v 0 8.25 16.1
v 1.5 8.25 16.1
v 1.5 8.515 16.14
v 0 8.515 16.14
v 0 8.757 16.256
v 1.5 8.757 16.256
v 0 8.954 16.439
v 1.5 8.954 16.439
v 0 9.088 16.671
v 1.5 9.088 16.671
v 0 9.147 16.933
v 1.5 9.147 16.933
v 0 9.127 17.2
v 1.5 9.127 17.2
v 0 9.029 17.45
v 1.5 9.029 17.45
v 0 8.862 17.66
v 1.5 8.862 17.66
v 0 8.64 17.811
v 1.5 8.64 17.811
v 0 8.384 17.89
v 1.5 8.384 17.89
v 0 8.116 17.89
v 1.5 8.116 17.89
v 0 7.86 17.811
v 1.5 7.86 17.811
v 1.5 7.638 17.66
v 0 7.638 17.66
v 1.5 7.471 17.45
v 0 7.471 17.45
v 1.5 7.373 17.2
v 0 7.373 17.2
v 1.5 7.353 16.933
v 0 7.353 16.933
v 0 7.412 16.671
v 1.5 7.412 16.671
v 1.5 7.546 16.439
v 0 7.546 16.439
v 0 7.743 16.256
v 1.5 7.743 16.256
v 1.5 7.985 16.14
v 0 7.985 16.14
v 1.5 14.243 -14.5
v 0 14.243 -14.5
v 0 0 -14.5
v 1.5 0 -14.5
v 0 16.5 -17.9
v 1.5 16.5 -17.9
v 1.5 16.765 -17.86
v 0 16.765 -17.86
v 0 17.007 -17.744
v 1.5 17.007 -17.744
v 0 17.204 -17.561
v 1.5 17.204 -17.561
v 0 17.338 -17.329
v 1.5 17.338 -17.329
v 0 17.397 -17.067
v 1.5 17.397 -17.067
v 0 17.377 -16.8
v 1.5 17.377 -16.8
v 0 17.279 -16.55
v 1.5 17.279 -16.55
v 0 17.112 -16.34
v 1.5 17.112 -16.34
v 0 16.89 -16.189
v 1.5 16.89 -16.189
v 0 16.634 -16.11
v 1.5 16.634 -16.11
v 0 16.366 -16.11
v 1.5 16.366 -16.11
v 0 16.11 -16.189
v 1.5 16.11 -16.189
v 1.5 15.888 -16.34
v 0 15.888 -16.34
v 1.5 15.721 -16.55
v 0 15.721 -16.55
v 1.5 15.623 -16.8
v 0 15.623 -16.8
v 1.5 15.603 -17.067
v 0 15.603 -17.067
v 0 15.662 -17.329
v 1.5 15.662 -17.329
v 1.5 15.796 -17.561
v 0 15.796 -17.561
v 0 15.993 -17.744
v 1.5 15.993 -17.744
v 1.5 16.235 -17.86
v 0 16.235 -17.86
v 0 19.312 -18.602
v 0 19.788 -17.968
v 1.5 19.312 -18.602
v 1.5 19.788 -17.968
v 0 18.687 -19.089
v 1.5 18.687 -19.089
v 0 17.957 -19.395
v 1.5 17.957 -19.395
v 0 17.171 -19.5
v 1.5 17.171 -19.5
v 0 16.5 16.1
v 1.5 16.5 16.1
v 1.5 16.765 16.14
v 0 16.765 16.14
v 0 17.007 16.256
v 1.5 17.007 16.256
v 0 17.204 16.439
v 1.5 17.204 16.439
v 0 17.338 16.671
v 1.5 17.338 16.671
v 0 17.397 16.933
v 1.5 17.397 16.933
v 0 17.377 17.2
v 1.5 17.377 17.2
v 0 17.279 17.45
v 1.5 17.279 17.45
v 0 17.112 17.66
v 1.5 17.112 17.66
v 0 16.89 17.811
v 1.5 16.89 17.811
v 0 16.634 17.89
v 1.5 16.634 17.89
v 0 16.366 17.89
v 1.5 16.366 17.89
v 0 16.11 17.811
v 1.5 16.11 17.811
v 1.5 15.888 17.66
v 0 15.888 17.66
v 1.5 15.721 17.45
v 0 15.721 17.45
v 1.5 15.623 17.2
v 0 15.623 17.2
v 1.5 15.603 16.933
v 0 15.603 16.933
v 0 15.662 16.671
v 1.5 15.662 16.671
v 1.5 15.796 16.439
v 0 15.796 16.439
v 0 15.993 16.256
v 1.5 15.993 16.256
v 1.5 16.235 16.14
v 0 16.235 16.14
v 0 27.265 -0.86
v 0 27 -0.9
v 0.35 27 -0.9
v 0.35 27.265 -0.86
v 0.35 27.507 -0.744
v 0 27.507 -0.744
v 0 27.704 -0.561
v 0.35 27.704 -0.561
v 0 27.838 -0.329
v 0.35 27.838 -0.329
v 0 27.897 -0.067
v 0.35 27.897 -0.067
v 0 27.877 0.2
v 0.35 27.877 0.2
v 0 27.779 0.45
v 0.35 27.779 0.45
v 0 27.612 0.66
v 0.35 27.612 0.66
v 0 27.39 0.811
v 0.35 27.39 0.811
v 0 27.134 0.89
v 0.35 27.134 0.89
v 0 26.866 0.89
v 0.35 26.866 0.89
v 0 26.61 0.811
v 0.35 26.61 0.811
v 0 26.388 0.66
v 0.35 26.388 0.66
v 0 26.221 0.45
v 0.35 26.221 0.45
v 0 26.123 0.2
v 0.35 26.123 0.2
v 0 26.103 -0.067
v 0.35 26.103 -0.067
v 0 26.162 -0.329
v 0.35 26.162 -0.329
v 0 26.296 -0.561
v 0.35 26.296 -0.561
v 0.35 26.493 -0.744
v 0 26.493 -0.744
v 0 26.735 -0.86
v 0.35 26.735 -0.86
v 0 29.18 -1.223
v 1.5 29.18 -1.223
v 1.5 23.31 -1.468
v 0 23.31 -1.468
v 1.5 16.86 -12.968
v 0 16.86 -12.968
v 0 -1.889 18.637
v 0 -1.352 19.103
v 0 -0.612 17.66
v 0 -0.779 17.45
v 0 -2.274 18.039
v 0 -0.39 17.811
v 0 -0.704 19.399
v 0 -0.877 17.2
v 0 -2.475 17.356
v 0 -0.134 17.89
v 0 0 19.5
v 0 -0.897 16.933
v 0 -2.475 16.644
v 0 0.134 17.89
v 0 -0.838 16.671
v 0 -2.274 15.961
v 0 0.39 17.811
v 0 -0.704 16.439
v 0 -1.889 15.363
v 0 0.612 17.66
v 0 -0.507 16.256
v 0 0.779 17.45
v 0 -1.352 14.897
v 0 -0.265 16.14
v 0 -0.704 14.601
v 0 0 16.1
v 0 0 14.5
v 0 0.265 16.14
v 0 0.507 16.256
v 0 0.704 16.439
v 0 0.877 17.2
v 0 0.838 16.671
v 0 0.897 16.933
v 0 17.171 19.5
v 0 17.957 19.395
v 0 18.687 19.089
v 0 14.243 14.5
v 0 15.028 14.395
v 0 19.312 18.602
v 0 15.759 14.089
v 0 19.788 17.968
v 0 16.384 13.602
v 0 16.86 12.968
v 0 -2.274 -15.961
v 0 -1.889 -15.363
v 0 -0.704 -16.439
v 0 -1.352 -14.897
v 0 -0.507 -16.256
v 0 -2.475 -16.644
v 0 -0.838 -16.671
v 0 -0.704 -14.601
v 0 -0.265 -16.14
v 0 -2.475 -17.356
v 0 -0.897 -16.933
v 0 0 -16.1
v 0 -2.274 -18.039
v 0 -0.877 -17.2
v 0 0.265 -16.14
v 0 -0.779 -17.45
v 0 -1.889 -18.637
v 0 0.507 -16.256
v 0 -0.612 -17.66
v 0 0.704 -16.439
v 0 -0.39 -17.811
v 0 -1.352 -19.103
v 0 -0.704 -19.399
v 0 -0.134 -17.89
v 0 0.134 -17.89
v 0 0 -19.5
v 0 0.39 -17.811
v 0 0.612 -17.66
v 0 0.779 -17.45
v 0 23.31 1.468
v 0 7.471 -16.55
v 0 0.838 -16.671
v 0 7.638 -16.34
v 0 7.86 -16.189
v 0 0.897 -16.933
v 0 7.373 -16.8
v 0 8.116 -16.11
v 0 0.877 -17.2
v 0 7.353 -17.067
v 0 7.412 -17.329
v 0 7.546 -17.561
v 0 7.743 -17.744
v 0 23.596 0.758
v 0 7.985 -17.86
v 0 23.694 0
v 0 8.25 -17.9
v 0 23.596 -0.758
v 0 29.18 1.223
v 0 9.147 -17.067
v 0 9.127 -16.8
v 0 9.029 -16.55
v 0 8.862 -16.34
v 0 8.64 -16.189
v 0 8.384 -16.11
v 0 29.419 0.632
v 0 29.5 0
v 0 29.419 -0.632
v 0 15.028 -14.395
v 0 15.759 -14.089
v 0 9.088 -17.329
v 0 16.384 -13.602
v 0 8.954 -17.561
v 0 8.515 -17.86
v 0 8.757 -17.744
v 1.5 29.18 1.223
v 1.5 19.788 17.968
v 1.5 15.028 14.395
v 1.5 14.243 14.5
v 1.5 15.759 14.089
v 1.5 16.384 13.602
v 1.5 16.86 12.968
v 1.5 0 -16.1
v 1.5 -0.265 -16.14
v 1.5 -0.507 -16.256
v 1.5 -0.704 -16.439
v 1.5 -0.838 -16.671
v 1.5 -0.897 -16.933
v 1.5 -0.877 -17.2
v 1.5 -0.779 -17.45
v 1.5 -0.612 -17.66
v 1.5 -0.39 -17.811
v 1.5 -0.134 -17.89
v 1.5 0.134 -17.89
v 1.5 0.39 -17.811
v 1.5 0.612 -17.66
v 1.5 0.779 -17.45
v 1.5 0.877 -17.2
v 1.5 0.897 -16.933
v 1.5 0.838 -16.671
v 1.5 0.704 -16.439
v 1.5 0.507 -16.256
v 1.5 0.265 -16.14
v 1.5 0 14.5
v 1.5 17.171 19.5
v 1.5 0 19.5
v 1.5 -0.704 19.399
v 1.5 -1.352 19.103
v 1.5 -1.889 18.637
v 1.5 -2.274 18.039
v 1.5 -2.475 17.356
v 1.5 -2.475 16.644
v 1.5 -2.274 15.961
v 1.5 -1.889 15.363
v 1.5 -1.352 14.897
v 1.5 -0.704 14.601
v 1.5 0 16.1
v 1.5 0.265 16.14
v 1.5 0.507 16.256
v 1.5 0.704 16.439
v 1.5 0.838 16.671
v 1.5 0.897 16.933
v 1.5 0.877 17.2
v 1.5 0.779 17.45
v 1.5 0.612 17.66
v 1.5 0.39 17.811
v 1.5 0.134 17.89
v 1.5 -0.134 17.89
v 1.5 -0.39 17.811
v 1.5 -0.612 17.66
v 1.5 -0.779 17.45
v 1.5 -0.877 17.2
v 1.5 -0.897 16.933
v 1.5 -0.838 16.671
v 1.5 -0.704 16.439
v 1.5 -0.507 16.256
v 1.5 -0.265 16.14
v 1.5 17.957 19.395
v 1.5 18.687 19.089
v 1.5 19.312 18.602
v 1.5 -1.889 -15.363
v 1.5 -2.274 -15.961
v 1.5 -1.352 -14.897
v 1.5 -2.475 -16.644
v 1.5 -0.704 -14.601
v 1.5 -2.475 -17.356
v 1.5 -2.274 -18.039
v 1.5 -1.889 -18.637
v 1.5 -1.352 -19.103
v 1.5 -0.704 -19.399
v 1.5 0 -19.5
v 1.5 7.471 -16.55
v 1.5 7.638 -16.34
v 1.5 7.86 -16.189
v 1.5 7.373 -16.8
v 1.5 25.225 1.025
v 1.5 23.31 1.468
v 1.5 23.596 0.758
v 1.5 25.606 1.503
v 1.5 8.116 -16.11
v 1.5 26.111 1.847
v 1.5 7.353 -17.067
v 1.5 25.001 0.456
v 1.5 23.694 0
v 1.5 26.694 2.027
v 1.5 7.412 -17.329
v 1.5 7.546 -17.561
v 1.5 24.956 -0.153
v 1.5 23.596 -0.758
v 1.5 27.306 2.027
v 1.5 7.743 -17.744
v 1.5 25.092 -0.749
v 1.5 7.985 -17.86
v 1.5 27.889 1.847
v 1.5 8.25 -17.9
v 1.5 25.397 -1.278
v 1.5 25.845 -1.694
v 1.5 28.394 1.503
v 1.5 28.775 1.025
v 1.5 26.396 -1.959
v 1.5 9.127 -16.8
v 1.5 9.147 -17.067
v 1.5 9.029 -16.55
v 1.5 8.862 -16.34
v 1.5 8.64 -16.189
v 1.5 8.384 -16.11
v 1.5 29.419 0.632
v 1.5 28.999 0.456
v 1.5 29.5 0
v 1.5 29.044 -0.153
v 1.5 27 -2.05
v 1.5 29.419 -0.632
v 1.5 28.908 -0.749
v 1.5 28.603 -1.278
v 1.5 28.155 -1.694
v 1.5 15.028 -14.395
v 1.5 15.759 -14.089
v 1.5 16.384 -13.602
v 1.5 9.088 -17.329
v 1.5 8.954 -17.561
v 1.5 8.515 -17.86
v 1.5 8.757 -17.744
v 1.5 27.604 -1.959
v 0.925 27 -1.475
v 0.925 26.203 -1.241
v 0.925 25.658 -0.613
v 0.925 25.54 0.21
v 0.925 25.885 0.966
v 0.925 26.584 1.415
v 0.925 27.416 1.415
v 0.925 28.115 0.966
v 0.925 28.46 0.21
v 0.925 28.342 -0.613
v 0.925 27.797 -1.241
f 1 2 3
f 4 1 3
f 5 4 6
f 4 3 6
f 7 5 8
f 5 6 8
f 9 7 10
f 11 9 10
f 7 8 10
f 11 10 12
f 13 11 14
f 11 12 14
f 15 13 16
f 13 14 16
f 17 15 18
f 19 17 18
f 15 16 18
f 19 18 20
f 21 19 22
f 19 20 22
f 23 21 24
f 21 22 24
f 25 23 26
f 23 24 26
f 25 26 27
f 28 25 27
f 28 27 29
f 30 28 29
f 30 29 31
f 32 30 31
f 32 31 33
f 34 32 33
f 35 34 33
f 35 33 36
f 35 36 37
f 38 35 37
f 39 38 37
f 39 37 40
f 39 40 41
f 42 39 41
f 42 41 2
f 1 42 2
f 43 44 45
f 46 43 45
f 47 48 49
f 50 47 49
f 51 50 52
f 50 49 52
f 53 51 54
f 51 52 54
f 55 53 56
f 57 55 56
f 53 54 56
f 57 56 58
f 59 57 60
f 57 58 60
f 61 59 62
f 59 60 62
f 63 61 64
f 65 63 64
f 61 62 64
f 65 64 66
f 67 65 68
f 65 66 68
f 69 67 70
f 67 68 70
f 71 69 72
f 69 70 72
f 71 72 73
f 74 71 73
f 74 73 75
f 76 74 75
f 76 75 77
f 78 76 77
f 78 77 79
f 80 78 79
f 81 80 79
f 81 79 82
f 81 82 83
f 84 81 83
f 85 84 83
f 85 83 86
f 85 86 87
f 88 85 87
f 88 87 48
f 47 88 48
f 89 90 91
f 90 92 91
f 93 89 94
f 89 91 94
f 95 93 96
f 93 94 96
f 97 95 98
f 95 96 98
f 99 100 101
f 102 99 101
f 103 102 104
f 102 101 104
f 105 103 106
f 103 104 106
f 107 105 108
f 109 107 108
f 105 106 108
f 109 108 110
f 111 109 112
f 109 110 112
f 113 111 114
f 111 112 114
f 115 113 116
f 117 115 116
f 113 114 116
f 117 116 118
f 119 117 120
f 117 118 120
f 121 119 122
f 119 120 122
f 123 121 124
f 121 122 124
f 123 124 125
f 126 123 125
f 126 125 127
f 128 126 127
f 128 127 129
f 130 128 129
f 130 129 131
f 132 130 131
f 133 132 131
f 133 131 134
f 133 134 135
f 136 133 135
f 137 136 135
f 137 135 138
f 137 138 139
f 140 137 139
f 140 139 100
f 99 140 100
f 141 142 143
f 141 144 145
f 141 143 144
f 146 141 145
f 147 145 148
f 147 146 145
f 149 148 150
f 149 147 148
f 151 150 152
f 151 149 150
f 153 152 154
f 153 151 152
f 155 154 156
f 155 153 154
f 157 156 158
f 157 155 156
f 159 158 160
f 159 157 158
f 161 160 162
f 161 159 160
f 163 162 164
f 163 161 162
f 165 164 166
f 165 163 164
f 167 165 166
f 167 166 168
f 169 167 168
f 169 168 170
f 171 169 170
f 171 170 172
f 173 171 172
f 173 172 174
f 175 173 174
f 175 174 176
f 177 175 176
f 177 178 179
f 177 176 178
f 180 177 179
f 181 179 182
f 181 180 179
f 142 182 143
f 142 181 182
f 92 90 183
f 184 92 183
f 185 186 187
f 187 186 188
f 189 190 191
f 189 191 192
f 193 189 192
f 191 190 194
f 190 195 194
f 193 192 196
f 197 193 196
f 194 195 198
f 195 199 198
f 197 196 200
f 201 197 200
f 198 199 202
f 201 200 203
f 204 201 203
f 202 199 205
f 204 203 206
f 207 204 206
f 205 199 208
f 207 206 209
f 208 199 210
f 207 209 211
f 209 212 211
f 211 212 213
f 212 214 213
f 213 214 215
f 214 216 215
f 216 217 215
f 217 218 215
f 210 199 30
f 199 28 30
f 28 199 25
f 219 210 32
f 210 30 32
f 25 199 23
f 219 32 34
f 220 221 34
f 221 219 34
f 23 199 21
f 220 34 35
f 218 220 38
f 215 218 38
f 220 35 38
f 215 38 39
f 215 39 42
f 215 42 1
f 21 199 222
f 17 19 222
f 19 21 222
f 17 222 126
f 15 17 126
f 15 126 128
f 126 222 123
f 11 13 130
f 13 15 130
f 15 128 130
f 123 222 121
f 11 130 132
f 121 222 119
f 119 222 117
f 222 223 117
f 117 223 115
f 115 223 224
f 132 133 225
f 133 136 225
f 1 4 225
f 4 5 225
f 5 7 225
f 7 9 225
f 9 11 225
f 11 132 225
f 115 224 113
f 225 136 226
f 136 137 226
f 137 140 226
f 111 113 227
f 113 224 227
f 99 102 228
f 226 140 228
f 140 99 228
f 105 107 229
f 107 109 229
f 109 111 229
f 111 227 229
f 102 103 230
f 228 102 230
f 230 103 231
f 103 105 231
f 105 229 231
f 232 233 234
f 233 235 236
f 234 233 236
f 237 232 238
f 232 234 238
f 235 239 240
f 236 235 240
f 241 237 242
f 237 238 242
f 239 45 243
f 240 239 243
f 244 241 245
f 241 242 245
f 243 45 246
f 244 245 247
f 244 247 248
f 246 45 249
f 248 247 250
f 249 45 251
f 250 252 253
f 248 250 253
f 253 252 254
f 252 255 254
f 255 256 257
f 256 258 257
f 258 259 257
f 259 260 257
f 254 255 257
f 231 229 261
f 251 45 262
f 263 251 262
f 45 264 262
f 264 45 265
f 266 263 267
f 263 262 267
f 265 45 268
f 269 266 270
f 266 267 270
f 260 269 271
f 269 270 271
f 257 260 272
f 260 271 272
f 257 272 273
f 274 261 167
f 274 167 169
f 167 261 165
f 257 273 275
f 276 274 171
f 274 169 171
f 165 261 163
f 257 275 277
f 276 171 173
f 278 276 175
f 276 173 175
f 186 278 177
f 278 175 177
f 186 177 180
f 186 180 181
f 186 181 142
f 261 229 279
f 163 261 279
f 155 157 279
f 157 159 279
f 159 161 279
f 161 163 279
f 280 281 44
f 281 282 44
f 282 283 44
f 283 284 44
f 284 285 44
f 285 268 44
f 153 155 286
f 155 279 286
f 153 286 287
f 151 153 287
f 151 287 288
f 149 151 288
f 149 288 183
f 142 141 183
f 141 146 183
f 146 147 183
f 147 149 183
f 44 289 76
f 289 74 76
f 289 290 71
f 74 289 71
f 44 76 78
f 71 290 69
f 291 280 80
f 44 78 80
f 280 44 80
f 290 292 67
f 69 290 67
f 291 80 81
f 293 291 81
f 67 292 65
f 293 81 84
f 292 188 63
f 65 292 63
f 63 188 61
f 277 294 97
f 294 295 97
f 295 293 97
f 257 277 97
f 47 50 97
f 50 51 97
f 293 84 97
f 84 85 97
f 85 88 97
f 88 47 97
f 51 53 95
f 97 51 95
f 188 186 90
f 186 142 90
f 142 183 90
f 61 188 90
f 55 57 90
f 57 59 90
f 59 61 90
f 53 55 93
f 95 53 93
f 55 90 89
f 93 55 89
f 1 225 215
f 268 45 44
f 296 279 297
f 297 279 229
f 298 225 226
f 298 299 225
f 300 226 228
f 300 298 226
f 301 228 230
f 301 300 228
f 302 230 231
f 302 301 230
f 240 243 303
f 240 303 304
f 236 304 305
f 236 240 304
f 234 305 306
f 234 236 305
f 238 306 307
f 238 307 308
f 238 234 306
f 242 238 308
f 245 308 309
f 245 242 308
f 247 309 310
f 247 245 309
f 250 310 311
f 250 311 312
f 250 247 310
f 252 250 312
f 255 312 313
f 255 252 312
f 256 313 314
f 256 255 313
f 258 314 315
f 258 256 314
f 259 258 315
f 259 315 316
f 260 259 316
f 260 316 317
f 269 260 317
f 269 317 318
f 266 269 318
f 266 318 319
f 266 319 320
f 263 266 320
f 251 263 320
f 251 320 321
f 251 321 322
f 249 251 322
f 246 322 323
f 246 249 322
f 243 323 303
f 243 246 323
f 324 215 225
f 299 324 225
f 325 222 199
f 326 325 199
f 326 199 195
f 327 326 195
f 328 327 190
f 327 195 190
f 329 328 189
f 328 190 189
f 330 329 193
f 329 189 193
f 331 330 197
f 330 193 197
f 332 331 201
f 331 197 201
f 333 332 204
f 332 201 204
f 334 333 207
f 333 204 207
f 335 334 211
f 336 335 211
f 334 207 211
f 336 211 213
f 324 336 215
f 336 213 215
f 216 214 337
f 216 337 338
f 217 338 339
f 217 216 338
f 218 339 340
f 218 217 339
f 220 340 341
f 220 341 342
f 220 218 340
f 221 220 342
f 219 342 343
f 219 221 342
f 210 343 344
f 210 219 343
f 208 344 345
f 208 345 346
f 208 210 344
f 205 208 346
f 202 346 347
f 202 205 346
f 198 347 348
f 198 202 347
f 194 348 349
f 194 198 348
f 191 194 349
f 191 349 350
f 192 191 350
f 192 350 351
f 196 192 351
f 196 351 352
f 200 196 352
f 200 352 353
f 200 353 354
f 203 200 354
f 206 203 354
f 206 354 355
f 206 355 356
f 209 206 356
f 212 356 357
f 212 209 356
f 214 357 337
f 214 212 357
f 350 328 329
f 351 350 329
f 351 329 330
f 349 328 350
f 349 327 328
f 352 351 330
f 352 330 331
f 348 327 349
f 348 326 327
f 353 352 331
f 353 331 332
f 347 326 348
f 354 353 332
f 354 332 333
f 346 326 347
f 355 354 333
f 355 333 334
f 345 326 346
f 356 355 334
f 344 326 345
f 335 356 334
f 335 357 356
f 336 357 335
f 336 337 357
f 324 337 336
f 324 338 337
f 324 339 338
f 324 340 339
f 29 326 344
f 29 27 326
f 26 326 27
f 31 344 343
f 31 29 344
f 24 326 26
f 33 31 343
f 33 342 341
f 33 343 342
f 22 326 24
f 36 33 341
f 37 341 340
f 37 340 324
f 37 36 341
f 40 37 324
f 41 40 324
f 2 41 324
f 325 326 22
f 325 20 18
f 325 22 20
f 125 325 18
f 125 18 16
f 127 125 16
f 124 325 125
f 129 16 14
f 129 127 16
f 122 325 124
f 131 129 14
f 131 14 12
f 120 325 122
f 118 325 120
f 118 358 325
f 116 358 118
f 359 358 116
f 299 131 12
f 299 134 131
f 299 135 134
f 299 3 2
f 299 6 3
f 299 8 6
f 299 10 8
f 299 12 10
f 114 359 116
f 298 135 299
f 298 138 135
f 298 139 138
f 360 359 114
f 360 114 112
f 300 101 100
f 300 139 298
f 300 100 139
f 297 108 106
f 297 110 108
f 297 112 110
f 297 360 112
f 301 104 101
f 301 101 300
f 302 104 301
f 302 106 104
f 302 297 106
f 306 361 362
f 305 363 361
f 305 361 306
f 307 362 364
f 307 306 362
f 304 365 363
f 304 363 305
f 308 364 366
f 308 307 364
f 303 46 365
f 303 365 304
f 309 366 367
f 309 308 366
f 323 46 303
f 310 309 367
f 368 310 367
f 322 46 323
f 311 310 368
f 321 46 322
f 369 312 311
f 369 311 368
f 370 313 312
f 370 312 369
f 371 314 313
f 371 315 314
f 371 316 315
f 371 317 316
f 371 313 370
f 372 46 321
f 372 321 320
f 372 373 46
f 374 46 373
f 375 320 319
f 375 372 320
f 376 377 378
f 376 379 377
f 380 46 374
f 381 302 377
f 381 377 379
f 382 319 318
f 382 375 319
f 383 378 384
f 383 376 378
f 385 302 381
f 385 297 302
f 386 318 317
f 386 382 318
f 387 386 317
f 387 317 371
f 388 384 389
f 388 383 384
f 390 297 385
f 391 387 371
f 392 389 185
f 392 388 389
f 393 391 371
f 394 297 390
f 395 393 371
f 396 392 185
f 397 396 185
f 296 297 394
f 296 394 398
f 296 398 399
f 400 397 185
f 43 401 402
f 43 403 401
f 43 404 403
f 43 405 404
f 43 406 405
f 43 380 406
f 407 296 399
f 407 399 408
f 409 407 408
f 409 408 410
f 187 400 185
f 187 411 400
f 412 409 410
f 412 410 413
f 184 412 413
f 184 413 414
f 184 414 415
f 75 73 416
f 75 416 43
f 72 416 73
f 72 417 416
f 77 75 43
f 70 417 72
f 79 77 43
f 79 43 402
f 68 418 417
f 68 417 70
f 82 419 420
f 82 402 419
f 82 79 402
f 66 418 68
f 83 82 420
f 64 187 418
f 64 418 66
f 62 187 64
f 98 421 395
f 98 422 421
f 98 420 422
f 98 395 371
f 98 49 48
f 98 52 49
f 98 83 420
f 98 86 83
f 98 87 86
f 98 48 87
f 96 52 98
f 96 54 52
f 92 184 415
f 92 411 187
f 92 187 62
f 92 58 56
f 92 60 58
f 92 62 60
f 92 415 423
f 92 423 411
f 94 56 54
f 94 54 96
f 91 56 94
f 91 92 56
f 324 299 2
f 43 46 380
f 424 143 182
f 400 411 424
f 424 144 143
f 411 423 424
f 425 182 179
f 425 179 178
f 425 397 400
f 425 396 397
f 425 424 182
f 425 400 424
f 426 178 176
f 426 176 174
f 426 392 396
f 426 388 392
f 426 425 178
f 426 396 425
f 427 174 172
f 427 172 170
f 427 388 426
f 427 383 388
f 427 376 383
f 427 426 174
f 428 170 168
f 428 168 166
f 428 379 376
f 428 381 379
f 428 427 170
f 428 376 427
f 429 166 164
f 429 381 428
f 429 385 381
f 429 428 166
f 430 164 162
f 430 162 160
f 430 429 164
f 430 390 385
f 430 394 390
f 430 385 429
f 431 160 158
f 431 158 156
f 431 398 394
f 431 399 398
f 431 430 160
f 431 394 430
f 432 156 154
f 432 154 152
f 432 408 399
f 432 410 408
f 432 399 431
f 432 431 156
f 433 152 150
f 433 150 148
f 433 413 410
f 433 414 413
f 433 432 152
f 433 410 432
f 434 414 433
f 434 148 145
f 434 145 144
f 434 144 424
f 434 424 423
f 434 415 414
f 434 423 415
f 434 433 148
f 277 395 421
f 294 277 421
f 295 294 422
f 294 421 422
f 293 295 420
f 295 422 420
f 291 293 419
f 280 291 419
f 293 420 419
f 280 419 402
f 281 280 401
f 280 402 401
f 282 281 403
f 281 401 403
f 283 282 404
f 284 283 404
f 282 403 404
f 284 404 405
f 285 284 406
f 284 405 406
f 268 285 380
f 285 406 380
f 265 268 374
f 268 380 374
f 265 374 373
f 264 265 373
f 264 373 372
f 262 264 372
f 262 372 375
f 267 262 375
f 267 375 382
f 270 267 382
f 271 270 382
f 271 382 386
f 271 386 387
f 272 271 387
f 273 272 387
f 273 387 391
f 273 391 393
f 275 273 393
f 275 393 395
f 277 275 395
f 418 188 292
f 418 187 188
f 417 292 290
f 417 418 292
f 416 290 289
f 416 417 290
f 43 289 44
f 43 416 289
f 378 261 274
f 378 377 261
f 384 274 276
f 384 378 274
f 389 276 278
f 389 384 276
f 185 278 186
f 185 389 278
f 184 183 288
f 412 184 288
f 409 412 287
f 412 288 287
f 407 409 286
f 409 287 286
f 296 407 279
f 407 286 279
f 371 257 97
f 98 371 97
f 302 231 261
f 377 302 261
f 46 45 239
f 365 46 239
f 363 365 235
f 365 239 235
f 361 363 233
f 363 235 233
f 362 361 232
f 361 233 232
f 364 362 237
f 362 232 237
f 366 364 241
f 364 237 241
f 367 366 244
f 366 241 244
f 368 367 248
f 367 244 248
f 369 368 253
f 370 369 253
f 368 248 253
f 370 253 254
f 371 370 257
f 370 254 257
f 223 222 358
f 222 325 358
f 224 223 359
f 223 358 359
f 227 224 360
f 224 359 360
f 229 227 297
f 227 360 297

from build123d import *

# Parameters (mm, degrees)
SKETCH_1_R          = 0.9
EXTRUDE_1_DEPTH     = 1.5
FILLET_1_R          = 3
SKETCH_2_R          = 0.9
CUT_EXTRUDE_1_DEPTH = 10


with BuildPart() as part:
    # 草图1 → 凸台-拉伸1 (new body)
    with BuildSketch(Plane(origin=(0, 0, 0), x_dir=(0, 0, -1), z_dir=(1, 0, 0))):
        with BuildLine():
            Line((-14.5, 0), (-14.5, 16))
            Line((-14.5, 16), (0, 24.133548193))
            Line((0, 24.133548193), (14.5, 16))
            Line((14.5, 16), (14.5, 0))
            ThreePointArc((14.5, 0), (17, -2.5), (19.5, 0))
            Line((19.5, 0), (19.5, 18.928231824))
            Line((19.5, 18.928231824), (1.22305902, 29.180395981))
            ThreePointArc((1.22305902, 29.180395981), (0, 29.5), (-1.22305902, 29.180395981))
            Line((-1.22305902, 29.180395981), (-19.5, 18.928231824))
            Line((-19.5, 18.928231824), (-19.5, 0))
            ThreePointArc((-19.5, 0), (-17, -2.5), (-14.5, 0))
        make_face()
        with Locations((-17, 0)):
            Circle(SKETCH_1_R, mode=Mode.SUBTRACT)
        with Locations(Location((17, 0, 0), (0, 0, 180))):  # turned: the seam where the file's is
            Circle(SKETCH_1_R, mode=Mode.SUBTRACT)
        with Locations((0, 27)):
            Circle(SKETCH_1_R, mode=Mode.SUBTRACT)
    extrude(amount=EXTRUDE_1_DEPTH)

    # 圆角1
    fillet_1_edges = [part.edges().sort_by_distance(p)[0] for p in [
        (0.75, 18.928231824, 19.5),
        (0.75, 18.928231824, -19.5),
        (0.75, 16, -14.5),
        (0.75, 24.133548193, 0),
        (0.75, 16, 14.5),
    ]]
    fillet(fillet_1_edges, radius=FILLET_1_R)

    # 草图2 → 切除-拉伸1 (cut)
    with BuildSketch(Plane(origin=(1.5, 0, 0), x_dir=(0, 0, -1), z_dir=(1, 0, 0))):
        with Locations((-17, 16.5)):
            Circle(SKETCH_2_R)
        with Locations((-17, 8.25)):
            Circle(SKETCH_2_R)
        with Locations((17, 8.25)):
            Circle(SKETCH_2_R)
        with Locations((17, 16.5)):
            Circle(SKETCH_2_R)
    extrude(amount=-CUT_EXTRUDE_1_DEPTH, mode=Mode.SUBTRACT)

    # 草图3 → M2 平头机械螺钉的锥形沉头孔1 (revolve, cut)
    with BuildSketch(Plane(origin=(1.5, 27, 0), x_dir=(0, 0, -1), z_dir=(0, 1, 0))):
        Polygon((0, 0), (0, 1.5), (0.85, 1.5), (0.85, 1.2), (2.05, 0), align=None)
    revolve(axis=Axis((7.85, 27, 0), (-1, 0, 0)), mode=Mode.SUBTRACT)


solid = part.part
